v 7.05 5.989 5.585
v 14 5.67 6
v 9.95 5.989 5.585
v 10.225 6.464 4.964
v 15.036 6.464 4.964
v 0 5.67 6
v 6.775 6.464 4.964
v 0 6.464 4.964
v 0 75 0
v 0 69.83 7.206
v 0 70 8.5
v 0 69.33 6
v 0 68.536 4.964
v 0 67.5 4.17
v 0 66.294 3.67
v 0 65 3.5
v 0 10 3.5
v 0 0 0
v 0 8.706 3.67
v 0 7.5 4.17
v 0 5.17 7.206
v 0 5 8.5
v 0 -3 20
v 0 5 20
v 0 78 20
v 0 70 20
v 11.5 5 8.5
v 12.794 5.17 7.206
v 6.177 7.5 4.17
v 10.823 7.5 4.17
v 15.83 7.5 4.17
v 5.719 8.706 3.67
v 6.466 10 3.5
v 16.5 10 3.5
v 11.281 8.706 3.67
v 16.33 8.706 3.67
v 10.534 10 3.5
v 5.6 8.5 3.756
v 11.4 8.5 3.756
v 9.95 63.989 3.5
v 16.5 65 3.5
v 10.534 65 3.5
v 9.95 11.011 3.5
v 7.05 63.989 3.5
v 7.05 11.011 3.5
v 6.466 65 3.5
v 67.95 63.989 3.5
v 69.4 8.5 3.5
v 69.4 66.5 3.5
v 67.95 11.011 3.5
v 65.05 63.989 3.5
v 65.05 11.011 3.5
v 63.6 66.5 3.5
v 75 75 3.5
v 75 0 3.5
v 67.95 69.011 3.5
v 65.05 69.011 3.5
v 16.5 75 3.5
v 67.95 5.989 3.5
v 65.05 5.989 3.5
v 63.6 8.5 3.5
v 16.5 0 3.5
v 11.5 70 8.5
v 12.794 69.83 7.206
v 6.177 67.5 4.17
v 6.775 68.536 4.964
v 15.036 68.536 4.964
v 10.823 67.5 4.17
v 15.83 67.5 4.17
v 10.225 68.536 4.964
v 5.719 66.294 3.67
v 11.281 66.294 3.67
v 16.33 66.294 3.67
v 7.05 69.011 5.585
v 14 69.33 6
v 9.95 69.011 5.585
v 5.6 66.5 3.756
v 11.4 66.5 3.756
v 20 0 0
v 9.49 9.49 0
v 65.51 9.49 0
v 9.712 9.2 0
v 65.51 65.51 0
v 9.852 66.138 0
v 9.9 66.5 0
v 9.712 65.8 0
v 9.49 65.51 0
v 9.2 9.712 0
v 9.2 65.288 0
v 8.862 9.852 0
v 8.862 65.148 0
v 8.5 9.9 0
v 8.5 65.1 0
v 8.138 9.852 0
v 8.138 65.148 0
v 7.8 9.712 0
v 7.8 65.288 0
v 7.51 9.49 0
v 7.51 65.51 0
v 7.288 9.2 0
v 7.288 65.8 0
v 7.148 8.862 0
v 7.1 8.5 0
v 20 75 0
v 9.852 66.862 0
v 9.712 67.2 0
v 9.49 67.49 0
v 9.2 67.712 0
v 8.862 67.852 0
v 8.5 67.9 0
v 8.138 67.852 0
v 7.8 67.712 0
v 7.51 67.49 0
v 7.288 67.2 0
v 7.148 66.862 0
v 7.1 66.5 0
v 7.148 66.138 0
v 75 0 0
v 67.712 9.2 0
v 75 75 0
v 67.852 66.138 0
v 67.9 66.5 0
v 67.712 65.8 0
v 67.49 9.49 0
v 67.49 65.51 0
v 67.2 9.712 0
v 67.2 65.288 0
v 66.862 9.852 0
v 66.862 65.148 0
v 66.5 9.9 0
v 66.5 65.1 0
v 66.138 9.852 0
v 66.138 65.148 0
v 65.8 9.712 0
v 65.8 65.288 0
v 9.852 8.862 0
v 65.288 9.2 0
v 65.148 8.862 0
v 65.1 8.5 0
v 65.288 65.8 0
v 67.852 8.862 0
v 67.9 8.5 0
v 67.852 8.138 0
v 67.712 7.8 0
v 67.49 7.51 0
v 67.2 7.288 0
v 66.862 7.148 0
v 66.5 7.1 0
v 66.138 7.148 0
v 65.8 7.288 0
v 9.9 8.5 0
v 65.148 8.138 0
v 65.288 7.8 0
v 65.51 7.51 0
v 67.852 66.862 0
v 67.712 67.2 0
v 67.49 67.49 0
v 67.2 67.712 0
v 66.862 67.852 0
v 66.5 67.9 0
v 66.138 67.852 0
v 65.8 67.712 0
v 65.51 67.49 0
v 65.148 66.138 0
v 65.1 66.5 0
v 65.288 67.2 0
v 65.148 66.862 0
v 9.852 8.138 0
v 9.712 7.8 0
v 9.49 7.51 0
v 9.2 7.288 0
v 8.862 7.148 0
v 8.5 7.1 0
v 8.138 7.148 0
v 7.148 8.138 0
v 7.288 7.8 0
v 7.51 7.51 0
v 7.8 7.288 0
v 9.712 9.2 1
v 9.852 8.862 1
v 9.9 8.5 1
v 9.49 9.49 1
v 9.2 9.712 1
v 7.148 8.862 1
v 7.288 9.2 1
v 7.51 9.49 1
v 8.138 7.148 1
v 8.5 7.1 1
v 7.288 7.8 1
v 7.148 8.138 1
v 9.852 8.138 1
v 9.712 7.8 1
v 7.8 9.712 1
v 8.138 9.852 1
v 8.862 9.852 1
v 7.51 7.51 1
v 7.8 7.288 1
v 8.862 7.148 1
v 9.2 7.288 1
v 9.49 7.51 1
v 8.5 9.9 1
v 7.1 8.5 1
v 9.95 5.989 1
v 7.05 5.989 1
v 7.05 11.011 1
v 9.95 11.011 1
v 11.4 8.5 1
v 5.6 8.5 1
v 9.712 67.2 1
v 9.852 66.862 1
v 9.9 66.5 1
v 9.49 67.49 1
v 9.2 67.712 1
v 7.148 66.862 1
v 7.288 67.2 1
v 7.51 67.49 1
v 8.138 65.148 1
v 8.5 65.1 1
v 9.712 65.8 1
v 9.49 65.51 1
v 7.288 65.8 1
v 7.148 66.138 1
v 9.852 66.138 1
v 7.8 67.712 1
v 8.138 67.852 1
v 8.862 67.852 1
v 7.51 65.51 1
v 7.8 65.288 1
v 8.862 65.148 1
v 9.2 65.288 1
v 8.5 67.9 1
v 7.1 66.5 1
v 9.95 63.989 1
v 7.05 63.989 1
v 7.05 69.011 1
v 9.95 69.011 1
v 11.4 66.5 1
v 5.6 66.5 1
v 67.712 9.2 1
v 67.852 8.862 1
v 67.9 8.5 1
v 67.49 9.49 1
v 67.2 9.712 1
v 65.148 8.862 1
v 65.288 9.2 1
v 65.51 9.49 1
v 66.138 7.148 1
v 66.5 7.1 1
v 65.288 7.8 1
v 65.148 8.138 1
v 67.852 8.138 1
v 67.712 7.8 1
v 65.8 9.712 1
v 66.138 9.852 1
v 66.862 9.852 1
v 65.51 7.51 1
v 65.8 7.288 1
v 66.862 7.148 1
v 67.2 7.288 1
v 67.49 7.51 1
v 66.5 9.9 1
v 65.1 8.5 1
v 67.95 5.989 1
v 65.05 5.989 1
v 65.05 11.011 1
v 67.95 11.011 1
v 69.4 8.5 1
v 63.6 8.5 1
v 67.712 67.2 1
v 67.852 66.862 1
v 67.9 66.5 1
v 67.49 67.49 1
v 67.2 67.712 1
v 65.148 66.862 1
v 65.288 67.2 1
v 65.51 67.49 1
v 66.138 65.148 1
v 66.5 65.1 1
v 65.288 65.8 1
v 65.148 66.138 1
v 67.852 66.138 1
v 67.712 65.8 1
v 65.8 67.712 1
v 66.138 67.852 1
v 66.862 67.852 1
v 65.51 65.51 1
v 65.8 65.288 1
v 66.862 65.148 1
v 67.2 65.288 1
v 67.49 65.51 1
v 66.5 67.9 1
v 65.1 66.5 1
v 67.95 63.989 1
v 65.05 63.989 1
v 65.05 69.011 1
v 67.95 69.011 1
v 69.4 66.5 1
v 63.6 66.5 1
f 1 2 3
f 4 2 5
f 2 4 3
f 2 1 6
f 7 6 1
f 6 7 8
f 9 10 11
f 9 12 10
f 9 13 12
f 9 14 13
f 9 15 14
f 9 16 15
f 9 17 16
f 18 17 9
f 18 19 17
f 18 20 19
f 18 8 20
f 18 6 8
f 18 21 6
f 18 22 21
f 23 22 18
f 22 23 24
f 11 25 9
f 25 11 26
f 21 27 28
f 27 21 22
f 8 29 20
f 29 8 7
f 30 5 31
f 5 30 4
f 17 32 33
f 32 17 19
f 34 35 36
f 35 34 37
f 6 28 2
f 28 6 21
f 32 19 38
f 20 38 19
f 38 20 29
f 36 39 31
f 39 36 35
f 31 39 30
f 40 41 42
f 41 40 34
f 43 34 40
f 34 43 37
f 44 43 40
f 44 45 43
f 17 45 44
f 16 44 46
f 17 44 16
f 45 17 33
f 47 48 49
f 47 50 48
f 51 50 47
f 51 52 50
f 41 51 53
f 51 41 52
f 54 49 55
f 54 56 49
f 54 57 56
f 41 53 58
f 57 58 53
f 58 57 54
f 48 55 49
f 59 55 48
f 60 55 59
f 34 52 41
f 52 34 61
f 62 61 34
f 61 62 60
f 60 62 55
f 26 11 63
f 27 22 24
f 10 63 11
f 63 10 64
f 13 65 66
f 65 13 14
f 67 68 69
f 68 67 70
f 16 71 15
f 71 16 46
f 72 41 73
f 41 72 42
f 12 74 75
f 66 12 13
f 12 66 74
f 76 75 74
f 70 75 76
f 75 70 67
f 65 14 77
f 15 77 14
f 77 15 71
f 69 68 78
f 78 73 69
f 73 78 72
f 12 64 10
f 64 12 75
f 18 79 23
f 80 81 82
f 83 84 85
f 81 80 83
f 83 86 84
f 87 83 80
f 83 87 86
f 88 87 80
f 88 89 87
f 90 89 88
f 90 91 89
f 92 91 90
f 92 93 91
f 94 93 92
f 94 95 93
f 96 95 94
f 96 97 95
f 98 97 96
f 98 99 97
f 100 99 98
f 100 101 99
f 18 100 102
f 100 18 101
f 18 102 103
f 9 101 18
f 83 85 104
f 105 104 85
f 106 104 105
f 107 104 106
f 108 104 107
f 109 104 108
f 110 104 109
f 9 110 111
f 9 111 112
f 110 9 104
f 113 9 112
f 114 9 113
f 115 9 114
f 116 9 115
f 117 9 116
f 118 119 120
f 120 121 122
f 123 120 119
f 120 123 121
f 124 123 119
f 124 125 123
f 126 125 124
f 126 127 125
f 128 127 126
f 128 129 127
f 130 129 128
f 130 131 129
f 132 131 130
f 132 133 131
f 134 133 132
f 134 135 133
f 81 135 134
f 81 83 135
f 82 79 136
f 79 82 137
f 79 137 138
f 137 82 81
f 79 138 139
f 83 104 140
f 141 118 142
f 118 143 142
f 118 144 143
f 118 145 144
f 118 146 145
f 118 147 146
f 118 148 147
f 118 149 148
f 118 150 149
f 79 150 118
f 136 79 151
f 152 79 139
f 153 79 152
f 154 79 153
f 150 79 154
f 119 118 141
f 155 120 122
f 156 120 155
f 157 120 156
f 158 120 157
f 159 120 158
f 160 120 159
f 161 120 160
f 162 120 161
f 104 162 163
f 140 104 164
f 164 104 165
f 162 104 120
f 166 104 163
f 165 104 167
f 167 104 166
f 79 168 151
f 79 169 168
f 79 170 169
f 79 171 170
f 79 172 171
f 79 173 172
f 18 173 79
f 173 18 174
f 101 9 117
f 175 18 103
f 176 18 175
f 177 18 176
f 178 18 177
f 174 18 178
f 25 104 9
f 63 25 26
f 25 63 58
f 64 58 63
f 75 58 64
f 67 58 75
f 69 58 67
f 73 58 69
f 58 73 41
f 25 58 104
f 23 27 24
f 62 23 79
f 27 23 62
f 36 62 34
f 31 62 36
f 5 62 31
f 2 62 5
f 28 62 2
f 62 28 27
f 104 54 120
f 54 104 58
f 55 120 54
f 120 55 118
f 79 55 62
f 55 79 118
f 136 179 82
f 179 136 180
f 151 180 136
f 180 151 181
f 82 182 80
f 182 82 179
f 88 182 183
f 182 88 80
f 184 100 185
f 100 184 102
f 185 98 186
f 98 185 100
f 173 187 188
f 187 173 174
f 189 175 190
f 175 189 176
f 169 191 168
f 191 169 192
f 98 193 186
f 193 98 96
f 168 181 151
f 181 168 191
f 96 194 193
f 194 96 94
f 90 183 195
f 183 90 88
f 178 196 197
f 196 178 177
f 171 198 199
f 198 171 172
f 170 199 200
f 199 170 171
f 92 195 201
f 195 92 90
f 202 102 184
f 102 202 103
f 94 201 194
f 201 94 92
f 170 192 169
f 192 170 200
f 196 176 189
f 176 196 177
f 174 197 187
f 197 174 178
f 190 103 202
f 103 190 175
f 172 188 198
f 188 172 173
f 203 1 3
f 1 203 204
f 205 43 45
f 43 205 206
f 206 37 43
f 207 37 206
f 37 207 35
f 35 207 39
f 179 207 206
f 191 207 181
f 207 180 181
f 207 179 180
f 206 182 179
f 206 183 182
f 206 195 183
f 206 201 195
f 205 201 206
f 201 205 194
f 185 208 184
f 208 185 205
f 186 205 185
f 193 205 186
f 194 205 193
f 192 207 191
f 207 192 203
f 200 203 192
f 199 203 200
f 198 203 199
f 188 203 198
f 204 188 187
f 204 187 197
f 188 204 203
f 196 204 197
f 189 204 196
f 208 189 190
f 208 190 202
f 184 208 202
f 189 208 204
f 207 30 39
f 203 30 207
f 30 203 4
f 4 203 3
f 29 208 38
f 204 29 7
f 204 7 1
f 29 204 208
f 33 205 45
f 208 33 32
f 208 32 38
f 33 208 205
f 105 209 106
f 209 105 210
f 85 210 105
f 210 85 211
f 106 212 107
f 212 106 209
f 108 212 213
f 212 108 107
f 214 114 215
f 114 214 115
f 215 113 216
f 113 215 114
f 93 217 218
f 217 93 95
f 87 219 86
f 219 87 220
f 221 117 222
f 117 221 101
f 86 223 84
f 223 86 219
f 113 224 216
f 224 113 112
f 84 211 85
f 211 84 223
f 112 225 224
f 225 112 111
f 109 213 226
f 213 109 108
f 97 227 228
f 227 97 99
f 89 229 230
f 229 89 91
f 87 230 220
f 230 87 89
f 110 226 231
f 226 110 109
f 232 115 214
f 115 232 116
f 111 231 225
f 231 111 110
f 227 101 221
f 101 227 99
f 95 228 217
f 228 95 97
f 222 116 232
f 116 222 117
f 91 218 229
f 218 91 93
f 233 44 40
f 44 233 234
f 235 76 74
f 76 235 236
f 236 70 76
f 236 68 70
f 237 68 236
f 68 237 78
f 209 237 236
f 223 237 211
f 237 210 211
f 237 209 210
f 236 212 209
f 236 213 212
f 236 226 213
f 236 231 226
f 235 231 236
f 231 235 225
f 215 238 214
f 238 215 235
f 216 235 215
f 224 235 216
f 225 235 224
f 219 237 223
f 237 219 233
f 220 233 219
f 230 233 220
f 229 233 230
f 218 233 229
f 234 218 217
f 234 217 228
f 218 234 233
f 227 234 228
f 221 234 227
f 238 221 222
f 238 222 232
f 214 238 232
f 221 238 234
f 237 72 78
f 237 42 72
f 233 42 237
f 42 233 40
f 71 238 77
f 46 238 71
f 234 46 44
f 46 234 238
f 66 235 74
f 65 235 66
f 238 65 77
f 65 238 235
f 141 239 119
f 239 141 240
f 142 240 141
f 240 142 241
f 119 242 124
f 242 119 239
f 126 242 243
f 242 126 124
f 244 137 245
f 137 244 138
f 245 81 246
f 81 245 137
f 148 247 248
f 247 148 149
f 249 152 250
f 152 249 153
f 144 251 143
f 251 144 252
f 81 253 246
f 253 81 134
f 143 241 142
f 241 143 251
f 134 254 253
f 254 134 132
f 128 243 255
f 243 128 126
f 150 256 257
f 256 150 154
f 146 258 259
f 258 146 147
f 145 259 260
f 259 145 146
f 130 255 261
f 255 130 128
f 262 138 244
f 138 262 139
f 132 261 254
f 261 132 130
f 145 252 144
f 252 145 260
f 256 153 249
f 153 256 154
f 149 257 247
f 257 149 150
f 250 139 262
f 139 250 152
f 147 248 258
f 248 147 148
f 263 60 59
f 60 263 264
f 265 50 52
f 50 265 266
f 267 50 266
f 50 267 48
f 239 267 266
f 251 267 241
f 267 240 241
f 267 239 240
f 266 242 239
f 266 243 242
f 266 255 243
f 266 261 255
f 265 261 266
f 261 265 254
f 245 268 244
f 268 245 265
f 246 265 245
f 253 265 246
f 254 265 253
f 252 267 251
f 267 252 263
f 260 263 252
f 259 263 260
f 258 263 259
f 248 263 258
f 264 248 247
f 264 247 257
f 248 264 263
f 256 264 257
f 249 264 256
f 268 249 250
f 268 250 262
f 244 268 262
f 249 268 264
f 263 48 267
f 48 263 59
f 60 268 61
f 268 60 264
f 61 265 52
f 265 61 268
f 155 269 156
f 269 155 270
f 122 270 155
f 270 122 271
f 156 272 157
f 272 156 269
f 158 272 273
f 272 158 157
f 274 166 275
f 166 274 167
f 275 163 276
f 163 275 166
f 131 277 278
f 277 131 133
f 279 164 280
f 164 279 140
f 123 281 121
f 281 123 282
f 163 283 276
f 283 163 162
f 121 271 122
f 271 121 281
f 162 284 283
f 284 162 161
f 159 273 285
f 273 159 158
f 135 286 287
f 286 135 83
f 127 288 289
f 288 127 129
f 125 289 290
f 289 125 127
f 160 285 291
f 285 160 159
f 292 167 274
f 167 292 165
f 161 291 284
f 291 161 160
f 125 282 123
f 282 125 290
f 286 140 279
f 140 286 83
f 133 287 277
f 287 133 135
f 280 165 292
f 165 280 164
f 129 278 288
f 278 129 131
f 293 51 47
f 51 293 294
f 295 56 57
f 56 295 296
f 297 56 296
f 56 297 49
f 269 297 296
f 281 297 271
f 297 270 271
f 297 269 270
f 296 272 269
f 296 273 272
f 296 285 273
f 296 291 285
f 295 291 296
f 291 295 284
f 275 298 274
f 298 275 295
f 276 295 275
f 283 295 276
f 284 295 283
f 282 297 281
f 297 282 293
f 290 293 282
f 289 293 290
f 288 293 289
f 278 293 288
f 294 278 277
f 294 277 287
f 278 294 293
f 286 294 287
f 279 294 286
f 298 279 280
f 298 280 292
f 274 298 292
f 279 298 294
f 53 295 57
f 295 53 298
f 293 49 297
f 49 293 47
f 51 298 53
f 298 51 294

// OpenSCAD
width = 75;
mgn = 8.5;
hole = 2.8;
top_hole = 5.8;
height = 3.5;
tp = 1;
$fn=24;

b = 20;
h = 20;
w = 4;

l = 10;
c = 5;
kkk = height + c;
q = 60;
ppp = 3;
union(){
    difference() { 
        union(){
            translate([0, 0, 0]){
                linear_extrude(height)
                    square([width, width]);
            }
            difference() {
                translate([0,-ppp,0])
                rotate(a=[-90,-90,0]) {
                linear_extrude(height = width+ ppp * 2, convexity = 10, twist = 0)
                    polygon(points=[[0,0],[h,0],[0,b]], paths=[[0,1,2]]);
                }
            rotate(a=[0,90,0]) mirror(v=[1,0,0]) p();
            rotate(a=[-90,-90,-90])kk();
            }
        }
        //hole
        for(x = [mgn, width-mgn]){
            for(y = [mgn, width-mgn]) {
                top_hole(x,y);
            }
        }
    }
}


module top_hole(x,y) {
    translate([x, y,0])
        cylinder( d = hole, h = height+h);
    translate([x, y, tp])
        cylinder( d = top_hole, h = height+h,$fn = 6);
}

module p() {
    translate([kkk, l ,0])
        cylinder(r = c, h = q);
    translate([kkk - c, l , 0])
        linear_extrude(q)
            square([c, width - l * 2]);
    translate([kkk, l - c, 0])
        linear_extrude(q)
            square([20, width - l * 2 + c * 2]);
    translate([kkk, width - l ,0])
        cylinder(r = c, h = q);
}

module kk() {
    linear_extrude(height = width, convexity = 10, twist = 0){
        polygon(points=[[0,0], [0,ppp], [h,ppp]], paths=[[0,1,2]]);
    }

    linear_extrude(height = width, convexity = 10, twist = 0){
        polygon(points=[[0,-width], [0, -width - ppp], [h,-width-ppp]], paths=[[0,1,2]]);
    }
}
